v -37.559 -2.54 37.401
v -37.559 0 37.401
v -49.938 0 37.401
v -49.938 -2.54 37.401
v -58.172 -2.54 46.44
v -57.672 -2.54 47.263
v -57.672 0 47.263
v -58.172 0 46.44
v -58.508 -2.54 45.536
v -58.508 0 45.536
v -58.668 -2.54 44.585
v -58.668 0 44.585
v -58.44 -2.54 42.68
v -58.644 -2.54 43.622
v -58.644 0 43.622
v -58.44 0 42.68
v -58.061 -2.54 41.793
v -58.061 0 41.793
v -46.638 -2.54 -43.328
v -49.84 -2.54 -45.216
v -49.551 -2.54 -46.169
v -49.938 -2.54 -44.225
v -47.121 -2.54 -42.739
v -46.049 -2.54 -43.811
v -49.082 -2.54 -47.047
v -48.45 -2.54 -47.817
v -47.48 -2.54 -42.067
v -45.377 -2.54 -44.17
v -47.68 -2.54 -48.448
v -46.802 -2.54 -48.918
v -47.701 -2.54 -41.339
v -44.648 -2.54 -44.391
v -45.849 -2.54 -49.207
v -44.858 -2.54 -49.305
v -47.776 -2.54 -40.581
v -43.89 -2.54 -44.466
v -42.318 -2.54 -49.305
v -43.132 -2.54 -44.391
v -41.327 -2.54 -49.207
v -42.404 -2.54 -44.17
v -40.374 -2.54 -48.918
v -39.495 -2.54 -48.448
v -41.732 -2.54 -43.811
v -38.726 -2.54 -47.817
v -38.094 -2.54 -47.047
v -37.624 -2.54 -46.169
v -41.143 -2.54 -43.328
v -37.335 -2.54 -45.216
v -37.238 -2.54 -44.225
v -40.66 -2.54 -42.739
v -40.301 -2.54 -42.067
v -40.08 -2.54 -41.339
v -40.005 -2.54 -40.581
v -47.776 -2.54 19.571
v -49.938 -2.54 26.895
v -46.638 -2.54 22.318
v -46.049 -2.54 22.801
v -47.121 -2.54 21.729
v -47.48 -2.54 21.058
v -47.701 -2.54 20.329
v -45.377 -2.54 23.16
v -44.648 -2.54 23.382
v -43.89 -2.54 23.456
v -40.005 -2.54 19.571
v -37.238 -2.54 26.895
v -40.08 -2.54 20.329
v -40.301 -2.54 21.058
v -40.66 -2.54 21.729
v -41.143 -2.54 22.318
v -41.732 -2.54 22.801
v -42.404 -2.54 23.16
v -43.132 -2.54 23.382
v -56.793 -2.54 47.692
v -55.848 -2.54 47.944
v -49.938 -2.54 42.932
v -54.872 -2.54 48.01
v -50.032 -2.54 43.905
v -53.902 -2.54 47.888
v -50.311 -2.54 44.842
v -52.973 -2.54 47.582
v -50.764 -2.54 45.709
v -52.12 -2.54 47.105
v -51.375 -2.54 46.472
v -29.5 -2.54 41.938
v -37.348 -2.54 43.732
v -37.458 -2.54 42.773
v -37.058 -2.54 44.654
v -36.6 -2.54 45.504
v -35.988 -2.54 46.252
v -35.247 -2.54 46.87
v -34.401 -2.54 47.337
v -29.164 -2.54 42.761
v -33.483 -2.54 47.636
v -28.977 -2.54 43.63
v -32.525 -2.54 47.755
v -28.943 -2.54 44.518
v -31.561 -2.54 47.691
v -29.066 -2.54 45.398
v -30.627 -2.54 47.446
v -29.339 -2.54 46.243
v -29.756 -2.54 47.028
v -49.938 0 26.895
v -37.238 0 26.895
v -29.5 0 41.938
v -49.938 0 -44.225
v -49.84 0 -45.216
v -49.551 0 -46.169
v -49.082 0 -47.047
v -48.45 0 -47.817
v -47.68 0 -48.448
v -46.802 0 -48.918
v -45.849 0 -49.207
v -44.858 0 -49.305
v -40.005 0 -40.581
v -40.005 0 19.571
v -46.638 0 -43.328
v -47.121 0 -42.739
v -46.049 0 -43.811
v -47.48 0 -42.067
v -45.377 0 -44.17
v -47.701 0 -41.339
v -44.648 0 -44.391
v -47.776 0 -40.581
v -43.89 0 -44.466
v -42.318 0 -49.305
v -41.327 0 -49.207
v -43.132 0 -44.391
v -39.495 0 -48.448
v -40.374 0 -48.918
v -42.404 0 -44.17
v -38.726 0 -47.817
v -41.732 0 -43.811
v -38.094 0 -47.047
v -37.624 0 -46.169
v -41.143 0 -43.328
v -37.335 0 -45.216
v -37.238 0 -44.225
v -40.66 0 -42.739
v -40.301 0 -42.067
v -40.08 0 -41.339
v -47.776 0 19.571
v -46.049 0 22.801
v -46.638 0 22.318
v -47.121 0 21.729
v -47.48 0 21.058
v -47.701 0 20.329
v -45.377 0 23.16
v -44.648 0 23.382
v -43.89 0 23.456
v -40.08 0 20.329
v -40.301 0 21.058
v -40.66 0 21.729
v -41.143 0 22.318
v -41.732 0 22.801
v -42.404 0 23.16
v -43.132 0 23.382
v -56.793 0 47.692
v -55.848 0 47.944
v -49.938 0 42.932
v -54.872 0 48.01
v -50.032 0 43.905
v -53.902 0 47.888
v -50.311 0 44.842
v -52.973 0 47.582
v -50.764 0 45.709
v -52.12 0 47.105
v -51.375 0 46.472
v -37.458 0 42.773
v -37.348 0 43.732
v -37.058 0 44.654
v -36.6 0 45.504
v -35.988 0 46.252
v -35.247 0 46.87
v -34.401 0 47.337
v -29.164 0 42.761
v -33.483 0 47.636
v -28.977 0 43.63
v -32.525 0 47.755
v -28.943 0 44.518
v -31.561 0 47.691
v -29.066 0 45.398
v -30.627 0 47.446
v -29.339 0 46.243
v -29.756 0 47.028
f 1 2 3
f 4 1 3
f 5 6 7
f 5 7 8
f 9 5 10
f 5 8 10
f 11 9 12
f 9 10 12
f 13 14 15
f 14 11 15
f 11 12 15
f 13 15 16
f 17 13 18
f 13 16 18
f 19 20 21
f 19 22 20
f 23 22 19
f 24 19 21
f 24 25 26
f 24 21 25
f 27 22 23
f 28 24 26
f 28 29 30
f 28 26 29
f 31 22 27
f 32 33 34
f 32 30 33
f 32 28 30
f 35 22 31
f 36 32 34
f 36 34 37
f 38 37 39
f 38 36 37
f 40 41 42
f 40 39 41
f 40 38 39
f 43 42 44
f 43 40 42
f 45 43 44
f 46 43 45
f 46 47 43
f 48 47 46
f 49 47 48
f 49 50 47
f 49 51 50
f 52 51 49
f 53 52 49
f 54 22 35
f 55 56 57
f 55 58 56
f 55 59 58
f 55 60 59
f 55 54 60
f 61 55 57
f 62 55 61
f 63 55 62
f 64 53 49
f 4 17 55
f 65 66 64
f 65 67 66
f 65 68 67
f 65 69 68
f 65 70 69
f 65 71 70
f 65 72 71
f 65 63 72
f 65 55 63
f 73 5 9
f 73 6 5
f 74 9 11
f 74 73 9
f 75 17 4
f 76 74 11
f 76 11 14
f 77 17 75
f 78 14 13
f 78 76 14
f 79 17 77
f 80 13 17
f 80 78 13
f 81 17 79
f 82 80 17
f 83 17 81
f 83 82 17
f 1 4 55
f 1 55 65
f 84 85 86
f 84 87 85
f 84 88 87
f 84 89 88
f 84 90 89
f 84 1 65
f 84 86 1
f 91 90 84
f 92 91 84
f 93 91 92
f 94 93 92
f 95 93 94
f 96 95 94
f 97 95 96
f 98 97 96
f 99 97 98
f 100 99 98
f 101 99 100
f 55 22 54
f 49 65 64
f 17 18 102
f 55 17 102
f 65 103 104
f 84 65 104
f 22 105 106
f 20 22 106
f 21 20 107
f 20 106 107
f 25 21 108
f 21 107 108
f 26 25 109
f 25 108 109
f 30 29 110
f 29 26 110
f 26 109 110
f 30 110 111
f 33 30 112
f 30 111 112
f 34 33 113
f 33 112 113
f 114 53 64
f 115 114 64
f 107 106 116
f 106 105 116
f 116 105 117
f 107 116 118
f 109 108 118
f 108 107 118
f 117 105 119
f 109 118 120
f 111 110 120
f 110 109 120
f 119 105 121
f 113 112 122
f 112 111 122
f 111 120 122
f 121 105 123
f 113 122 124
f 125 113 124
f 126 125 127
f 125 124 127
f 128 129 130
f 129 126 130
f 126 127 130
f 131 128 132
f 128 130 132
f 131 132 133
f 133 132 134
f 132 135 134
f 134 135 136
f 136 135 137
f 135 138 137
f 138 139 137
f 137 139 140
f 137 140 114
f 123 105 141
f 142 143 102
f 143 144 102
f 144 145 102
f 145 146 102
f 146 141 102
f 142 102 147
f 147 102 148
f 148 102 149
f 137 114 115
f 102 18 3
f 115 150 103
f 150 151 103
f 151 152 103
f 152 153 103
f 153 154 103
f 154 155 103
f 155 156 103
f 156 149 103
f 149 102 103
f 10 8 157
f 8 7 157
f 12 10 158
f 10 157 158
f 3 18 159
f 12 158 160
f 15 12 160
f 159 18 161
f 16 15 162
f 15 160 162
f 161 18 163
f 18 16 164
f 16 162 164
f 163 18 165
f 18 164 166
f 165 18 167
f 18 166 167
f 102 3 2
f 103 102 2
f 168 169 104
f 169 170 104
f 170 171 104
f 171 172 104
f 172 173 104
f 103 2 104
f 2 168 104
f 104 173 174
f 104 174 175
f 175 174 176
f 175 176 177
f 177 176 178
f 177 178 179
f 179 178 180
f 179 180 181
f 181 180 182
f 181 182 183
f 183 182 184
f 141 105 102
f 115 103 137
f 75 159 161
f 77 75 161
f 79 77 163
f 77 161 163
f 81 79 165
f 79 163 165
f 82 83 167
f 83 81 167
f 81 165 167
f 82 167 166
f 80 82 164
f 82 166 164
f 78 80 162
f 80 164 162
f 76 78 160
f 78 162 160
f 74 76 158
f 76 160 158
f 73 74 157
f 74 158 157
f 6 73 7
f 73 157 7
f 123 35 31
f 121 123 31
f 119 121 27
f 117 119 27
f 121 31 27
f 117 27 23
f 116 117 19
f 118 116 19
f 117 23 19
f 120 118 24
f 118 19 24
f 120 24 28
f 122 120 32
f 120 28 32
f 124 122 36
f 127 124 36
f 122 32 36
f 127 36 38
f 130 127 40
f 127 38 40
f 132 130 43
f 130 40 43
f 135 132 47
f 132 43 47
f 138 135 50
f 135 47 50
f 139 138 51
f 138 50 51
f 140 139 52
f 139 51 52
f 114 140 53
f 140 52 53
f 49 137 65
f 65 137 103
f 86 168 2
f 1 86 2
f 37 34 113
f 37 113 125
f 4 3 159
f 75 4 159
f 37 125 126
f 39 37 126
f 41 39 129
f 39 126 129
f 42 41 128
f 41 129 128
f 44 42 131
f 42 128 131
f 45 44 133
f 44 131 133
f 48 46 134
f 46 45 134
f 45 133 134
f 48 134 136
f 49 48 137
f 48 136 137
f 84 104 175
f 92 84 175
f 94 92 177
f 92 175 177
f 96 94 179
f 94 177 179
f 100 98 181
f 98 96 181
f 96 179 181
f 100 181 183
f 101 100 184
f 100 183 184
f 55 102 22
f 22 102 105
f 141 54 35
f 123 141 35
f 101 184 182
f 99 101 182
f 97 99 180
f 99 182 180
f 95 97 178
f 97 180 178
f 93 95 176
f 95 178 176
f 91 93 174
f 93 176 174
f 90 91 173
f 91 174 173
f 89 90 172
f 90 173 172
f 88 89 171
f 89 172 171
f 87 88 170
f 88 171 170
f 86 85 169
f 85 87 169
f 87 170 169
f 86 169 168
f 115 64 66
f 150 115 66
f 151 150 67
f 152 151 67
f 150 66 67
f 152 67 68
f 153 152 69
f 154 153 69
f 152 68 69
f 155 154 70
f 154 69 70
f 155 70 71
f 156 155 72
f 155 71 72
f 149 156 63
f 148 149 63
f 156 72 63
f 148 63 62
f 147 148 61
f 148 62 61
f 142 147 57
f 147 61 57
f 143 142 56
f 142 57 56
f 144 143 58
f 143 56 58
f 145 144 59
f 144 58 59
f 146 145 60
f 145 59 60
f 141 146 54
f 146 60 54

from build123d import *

# Parameters (mm, degrees)
F1_DEPTH    = 2.54
F2_T1_DEPTH = 21.3951912934
F2_T3_DEPTH = 22.4631654102
F2_T5_DEPTH = 27.94
F2_T7_DEPTH = 60.9088837652
F2_T9_DEPTH = 60.1042195061
F4_DEPTH    = 2.541


# Not quite as in the source:
# - a fillet or chamfer that OpenCascade refuses, or shapes differently, is made with other operations: its cross-section is extruded or revolved along the edge and cut away or added


with BuildPart() as f1:
    # F0 (on Front) → F1 (new body)
    with BuildSketch(Plane.XZ):
        Polygon((-49.9376785943, 26.895446232), (-49.9376785943, -49.304553768), (-37.2376785943, -49.304553768), (-37.2376785943, 26.895446232), (-27.7746748179, 45.2916584909), (-37.2376785943, 54.4446781278), (-37.5589355826, 37.401124835), (-49.9376785943, 37.401124835), (-49.9376785943, 54.4446781278), (-59.968046844, 45.2916584909), align=None)
    extrude(amount=F1_DEPTH)

    # F2: fillet of radius 5.08 on 6 edges, made by hand

    # F2_s2 → F2_t1 (cut)
    with BuildSketch(Plane.XZ.offset(-9.4275956467)):
        with BuildLine():
            ThreePointArc((-29.49965362, 41.9382754706), (-29.0047534445, 45.0887624488), (-30.4852273769, 47.9134201836))
            Line((-30.4852273769, 47.9134201836), (-27.7746748179, 45.2916584909))
            Line((-27.7746748179, 45.2916584909), (-29.49965362, 41.9382754706))
        make_face()
    extrude(amount=F2_T1_DEPTH, mode=Mode.SUBTRACT)

    # F2_s4 → F2_t3 (cut)
    with BuildSketch(Plane.XZ.offset(-9.9615827051)):
        with BuildLine():
            ThreePointArc((-57.0247017985, 47.9775514042), (-58.6106651129, 45.064296855), (-58.0605727295, 41.7932526681))
            Line((-58.0605727295, 41.7932526681), (-59.968046844, 45.2916584909))
            Line((-59.968046844, 45.2916584909), (-57.0247017985, 47.9775514042))
        make_face()
    extrude(amount=F2_T3_DEPTH, mode=Mode.SUBTRACT)

    # F2_s6 → F2_t5 (cut)
    with BuildSketch(Plane.XZ.offset(-12.7)):
        with BuildLine():
            ThreePointArc((-42.3176785943, -49.304553768), (-38.7255761459, -47.8166562165), (-37.2376785943, -44.224553768))
            Line((-37.2376785943, -44.224553768), (-37.2376785943, -49.304553768))
            Line((-37.2376785943, -49.304553768), (-42.3176785943, -49.304553768))
        make_face()
        with BuildLine():
            ThreePointArc((-49.9376785943, -44.224553768), (-48.4497810427, -47.8166562165), (-44.8576785943, -49.304553768))
            Line((-44.8576785943, -49.304553768), (-49.9376785943, -49.304553768))
            Line((-49.9376785943, -49.304553768), (-49.9376785943, -44.224553768))
        make_face()
    extrude(amount=F2_T5_DEPTH, mode=Mode.SUBTRACT)

    # F2_s8 → F2_t7 (cut)
    with BuildSketch(Plane.XZ.offset(-29.1844418826)):
        with BuildLine():
            ThreePointArc((-28.8467837584, 46.3286478461), (-34.3174578503, 47.3726785237), (-37.457680624, 42.7729746194))
            Line((-37.457680624, 42.7729746194), (-37.2376785943, 54.4446781278))
            Line((-37.2376785943, 54.4446781278), (-28.8467837584, 46.3286478461))
        make_face()
    extrude(amount=F2_T7_DEPTH, mode=Mode.SUBTRACT)

    # F2_s10 → F2_t9 (cut)
    with BuildSketch(Plane.XZ.offset(-28.782109753)):
        with BuildLine():
            ThreePointArc((-49.9376785943, 42.9318342266), (-52.9669146048, 47.5794967637), (-58.4419175941, 46.6842983866))
            Line((-58.4419175941, 46.6842983866), (-49.9376785943, 54.4446781278))
            Line((-49.9376785943, 54.4446781278), (-49.9376785943, 42.9318342266))
        make_face()
    extrude(amount=F2_T9_DEPTH, mode=Mode.SUBTRACT)

    # F3 (on face) → F4 (cut, through all)
    with BuildSketch(Plane.XZ.offset(2.54)):
        with BuildLine():
            Line((-40.0050021708, -40.580611676), (-40.0050021708, 19.5707920939))
            ThreePointArc((-40.0050021708, 19.5707920939), (-43.8903793693, 23.4561692923), (-47.7757565677, 19.5707920939))
            Line((-47.7757565677, 19.5707920939), (-47.7757565677, -40.580611676))
            ThreePointArc((-47.7757565677, -40.580611676), (-43.8903793693, -44.4659888744), (-40.0050021708, -40.580611676))
        make_face()
    extrude(amount=-F4_DEPTH, mode=Mode.SUBTRACT)


solid = f1.part
